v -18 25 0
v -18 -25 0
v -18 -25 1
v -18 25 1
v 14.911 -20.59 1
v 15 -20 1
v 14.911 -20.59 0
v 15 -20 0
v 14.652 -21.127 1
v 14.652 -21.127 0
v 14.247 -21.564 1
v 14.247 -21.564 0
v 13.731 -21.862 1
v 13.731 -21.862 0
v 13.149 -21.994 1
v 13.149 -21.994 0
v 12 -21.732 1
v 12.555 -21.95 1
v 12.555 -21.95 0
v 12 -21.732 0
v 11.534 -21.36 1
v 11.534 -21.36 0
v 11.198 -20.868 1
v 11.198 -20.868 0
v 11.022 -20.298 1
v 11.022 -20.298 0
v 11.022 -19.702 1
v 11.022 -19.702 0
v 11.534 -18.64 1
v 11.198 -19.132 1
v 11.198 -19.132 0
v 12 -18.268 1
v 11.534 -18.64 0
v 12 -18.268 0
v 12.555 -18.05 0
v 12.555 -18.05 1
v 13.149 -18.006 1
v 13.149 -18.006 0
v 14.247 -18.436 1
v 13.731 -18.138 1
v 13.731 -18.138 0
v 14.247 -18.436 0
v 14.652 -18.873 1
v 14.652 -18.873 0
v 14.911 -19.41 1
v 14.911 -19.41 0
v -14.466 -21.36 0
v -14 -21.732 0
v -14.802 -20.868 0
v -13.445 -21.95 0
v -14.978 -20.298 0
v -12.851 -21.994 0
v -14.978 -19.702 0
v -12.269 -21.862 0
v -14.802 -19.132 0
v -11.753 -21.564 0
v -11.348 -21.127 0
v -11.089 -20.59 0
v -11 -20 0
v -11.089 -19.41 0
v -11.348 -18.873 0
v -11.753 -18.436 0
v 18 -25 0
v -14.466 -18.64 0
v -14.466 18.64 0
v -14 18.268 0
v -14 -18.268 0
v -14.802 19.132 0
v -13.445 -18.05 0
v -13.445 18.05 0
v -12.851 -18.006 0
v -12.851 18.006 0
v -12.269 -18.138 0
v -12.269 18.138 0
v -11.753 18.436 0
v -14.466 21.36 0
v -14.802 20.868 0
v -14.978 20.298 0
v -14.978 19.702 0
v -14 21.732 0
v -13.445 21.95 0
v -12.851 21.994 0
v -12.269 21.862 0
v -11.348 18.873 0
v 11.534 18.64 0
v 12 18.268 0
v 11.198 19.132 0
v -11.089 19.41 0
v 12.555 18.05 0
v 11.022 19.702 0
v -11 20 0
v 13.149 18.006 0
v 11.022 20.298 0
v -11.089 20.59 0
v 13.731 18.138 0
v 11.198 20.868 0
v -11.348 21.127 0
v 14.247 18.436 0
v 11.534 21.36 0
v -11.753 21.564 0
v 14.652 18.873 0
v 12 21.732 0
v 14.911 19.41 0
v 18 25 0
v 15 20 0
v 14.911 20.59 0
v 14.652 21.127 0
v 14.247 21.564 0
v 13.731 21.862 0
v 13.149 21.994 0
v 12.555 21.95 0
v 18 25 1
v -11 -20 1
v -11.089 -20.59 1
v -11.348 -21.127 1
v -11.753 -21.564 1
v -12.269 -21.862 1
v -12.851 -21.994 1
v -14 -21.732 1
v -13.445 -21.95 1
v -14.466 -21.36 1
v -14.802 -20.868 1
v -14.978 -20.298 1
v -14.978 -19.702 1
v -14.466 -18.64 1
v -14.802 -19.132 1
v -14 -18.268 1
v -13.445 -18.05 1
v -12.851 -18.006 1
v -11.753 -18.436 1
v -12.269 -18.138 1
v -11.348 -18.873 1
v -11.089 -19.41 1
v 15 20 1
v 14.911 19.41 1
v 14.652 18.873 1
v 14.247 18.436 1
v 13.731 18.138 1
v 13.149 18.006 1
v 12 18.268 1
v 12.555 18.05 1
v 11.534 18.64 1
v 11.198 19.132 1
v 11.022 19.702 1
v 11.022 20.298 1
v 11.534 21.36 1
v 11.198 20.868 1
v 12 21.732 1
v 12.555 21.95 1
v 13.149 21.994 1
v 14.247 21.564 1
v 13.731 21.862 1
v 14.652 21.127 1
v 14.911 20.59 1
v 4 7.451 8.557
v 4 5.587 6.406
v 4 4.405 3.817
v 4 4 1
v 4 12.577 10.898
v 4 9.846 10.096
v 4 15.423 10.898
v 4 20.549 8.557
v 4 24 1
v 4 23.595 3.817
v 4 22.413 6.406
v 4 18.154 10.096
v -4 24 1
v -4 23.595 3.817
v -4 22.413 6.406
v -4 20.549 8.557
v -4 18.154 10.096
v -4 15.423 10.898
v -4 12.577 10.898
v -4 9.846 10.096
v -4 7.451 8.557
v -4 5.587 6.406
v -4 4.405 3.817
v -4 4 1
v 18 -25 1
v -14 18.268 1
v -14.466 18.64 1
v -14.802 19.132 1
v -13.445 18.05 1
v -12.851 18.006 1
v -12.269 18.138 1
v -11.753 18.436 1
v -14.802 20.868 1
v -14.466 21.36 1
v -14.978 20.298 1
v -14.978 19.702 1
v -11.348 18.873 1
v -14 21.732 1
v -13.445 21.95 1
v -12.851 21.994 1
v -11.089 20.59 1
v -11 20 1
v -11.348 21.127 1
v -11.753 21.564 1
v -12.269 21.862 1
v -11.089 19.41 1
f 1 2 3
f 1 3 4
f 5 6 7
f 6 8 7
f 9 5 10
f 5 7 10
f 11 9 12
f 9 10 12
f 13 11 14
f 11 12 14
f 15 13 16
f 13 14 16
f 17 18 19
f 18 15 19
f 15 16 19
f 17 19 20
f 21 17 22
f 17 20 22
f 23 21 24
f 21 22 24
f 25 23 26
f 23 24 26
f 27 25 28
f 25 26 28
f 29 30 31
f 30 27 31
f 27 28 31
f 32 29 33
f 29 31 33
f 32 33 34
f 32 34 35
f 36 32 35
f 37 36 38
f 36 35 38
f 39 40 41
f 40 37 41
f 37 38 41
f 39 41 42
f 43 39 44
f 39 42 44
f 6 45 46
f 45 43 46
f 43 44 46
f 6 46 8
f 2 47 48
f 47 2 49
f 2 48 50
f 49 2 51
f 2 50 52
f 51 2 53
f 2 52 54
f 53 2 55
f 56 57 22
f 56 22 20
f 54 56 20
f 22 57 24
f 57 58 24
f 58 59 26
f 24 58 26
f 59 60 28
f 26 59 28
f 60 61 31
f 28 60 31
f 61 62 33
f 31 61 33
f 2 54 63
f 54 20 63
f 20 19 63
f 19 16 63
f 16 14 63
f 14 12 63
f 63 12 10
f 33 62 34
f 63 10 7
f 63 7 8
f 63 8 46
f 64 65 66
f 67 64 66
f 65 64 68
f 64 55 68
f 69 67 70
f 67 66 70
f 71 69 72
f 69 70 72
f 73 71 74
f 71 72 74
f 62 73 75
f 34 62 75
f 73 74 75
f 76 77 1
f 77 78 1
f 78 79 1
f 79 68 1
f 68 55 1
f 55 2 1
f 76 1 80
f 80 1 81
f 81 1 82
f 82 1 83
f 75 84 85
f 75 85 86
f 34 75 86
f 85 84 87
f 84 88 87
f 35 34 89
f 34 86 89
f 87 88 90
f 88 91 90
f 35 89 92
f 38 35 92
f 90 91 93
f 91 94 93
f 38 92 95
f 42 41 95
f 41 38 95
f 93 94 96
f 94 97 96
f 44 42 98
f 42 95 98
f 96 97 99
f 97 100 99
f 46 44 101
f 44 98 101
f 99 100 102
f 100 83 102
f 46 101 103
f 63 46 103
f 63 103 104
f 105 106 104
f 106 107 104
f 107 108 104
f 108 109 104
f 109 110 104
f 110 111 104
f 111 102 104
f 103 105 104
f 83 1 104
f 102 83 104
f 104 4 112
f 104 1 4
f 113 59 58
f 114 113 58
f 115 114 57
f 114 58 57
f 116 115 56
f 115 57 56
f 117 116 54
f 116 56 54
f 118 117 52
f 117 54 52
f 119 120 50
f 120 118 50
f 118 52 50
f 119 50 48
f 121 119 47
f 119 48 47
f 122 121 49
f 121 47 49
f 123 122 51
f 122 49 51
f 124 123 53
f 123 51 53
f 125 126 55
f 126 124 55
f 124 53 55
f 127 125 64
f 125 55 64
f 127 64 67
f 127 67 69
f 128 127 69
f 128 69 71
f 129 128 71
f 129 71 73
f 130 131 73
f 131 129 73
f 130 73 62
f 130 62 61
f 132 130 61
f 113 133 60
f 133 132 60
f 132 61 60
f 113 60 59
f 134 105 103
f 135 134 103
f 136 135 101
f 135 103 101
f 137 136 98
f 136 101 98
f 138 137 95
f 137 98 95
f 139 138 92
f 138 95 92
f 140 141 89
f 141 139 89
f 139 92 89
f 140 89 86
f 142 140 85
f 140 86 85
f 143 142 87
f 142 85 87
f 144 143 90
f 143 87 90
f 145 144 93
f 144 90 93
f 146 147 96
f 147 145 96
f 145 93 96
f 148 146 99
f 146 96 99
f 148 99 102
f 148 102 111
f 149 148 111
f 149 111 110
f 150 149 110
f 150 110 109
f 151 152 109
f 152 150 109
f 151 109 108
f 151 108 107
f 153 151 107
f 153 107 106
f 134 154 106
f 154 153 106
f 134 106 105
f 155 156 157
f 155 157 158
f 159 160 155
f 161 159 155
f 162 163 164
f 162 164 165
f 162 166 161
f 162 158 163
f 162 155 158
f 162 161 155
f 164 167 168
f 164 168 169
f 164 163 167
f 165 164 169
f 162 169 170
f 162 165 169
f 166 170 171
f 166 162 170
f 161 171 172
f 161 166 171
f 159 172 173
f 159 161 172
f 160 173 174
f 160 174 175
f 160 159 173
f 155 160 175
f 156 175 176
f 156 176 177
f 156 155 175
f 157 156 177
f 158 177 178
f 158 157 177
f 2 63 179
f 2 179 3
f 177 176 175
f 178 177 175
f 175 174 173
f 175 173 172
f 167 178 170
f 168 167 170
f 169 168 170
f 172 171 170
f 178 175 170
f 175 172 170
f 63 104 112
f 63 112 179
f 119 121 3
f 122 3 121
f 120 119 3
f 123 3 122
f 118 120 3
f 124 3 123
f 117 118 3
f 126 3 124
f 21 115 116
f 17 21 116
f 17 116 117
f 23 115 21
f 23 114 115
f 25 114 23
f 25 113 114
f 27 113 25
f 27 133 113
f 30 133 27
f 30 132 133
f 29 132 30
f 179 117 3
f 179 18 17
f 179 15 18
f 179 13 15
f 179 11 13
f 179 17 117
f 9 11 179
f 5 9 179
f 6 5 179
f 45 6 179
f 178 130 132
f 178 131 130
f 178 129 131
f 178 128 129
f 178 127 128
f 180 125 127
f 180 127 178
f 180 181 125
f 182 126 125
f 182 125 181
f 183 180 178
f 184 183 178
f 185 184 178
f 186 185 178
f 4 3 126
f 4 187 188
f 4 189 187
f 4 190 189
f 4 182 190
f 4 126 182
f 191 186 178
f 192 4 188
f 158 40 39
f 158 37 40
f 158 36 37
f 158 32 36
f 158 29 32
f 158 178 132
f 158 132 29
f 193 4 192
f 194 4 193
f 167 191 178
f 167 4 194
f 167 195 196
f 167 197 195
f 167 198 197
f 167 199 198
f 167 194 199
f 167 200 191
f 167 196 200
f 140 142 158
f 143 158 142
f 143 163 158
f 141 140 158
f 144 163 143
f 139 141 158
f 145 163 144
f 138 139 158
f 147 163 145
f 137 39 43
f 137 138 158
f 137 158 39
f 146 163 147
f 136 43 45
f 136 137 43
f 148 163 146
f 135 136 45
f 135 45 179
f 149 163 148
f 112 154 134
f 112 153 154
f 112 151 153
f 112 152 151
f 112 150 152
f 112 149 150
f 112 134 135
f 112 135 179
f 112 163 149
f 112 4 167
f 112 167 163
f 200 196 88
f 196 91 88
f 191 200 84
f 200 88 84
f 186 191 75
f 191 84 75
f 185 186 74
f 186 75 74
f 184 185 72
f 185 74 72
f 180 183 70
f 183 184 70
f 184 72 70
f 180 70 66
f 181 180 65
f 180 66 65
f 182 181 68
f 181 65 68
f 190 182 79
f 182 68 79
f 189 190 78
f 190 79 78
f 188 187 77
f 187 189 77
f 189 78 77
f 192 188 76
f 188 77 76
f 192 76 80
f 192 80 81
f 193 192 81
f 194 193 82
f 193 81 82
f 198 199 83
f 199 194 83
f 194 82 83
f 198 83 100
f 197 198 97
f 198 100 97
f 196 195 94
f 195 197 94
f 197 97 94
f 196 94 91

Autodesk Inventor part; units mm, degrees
ref_plane "YZ Plane" through (0, 0, 0) normal (1, 0, 0) x (0, 1, 0)
ref_plane "XZ Plane" through (0, 0, 0) normal (0, 1, 0) x (-1, 0, 0)
ref_plane "XY Plane" through (0, 0, 0) normal (0, 0, 1) x (1, 0, 0)
sketch "Esboço1" plane through (0, 0, 0) normal (0, 0, 1) x (1, 0, 0)
  circle A0 centre (-13, -20) radius 2 projected
  circle A1 centre (-13, 20) radius 2 projected
  circle A2 centre (13, -20) radius 2 projected
  circle A3 centre (13, 20) radius 2 projected
  arc A4 (-15, 28) -> (-21, 22) centre (-15, 22) ccw projected
  line L0 (-21, 22) -> (-21, -38) projected
  arc A5 (-21, -38) -> (-15, -44) centre (-15, -38) ccw projected
  line L1 (-15, -44) -> (15, -44) projected
  arc A6 (15, -44) -> (21, -38) centre (15, -38) ccw projected
  line L2 (21, -38) -> (21, 22) projected
  arc A7 (21, 22) -> (15, 28) centre (15, 22) ccw projected
  line L3 (15, 28) -> (-15, 28) projected
  line L4 (-18, 25) -> (18, 25)
  line L5 (18, 25) -> (18, -25)
  line L6 (18, -25) -> (-18, -25)
  line L7 (-18, -25) -> (-18, 25)
  point P0 (0, 0)
extrude "Extrusão1" add sketch "Esboço1" along normal blind 1 contours L4 L5 L6 L7
sketch "Esboço2" plane through (0, 0, 1) normal (0, 0, 1) x (1, 0, 0)
  line L0 (-4, 24) -> (4, 24)
  line L1 (4, 24) -> (4, 14)
  line L2 (4, 14) -> (-4, 14)
  line L3 (-4, 14) -> (-4, 24)
  circle A0 centre (-13, 20) radius 2 projected
  circle A1 centre (13, 20) radius 2 projected
  line L4 (18, 25) -> (-18, 25) projected
  point P0 (0, 0)
  dimension "d7" = 8
  dimension "d8" = 10
  dimension "d10" = 7
  dimension "d12" = 1
revolve "Revolução1" add sketch "Esboço2" angle 180 about axis through (4, 14, 1) along (1, 0, 0) contours L0 L1 L2 L3
properties part number "Placa-Circuito"
